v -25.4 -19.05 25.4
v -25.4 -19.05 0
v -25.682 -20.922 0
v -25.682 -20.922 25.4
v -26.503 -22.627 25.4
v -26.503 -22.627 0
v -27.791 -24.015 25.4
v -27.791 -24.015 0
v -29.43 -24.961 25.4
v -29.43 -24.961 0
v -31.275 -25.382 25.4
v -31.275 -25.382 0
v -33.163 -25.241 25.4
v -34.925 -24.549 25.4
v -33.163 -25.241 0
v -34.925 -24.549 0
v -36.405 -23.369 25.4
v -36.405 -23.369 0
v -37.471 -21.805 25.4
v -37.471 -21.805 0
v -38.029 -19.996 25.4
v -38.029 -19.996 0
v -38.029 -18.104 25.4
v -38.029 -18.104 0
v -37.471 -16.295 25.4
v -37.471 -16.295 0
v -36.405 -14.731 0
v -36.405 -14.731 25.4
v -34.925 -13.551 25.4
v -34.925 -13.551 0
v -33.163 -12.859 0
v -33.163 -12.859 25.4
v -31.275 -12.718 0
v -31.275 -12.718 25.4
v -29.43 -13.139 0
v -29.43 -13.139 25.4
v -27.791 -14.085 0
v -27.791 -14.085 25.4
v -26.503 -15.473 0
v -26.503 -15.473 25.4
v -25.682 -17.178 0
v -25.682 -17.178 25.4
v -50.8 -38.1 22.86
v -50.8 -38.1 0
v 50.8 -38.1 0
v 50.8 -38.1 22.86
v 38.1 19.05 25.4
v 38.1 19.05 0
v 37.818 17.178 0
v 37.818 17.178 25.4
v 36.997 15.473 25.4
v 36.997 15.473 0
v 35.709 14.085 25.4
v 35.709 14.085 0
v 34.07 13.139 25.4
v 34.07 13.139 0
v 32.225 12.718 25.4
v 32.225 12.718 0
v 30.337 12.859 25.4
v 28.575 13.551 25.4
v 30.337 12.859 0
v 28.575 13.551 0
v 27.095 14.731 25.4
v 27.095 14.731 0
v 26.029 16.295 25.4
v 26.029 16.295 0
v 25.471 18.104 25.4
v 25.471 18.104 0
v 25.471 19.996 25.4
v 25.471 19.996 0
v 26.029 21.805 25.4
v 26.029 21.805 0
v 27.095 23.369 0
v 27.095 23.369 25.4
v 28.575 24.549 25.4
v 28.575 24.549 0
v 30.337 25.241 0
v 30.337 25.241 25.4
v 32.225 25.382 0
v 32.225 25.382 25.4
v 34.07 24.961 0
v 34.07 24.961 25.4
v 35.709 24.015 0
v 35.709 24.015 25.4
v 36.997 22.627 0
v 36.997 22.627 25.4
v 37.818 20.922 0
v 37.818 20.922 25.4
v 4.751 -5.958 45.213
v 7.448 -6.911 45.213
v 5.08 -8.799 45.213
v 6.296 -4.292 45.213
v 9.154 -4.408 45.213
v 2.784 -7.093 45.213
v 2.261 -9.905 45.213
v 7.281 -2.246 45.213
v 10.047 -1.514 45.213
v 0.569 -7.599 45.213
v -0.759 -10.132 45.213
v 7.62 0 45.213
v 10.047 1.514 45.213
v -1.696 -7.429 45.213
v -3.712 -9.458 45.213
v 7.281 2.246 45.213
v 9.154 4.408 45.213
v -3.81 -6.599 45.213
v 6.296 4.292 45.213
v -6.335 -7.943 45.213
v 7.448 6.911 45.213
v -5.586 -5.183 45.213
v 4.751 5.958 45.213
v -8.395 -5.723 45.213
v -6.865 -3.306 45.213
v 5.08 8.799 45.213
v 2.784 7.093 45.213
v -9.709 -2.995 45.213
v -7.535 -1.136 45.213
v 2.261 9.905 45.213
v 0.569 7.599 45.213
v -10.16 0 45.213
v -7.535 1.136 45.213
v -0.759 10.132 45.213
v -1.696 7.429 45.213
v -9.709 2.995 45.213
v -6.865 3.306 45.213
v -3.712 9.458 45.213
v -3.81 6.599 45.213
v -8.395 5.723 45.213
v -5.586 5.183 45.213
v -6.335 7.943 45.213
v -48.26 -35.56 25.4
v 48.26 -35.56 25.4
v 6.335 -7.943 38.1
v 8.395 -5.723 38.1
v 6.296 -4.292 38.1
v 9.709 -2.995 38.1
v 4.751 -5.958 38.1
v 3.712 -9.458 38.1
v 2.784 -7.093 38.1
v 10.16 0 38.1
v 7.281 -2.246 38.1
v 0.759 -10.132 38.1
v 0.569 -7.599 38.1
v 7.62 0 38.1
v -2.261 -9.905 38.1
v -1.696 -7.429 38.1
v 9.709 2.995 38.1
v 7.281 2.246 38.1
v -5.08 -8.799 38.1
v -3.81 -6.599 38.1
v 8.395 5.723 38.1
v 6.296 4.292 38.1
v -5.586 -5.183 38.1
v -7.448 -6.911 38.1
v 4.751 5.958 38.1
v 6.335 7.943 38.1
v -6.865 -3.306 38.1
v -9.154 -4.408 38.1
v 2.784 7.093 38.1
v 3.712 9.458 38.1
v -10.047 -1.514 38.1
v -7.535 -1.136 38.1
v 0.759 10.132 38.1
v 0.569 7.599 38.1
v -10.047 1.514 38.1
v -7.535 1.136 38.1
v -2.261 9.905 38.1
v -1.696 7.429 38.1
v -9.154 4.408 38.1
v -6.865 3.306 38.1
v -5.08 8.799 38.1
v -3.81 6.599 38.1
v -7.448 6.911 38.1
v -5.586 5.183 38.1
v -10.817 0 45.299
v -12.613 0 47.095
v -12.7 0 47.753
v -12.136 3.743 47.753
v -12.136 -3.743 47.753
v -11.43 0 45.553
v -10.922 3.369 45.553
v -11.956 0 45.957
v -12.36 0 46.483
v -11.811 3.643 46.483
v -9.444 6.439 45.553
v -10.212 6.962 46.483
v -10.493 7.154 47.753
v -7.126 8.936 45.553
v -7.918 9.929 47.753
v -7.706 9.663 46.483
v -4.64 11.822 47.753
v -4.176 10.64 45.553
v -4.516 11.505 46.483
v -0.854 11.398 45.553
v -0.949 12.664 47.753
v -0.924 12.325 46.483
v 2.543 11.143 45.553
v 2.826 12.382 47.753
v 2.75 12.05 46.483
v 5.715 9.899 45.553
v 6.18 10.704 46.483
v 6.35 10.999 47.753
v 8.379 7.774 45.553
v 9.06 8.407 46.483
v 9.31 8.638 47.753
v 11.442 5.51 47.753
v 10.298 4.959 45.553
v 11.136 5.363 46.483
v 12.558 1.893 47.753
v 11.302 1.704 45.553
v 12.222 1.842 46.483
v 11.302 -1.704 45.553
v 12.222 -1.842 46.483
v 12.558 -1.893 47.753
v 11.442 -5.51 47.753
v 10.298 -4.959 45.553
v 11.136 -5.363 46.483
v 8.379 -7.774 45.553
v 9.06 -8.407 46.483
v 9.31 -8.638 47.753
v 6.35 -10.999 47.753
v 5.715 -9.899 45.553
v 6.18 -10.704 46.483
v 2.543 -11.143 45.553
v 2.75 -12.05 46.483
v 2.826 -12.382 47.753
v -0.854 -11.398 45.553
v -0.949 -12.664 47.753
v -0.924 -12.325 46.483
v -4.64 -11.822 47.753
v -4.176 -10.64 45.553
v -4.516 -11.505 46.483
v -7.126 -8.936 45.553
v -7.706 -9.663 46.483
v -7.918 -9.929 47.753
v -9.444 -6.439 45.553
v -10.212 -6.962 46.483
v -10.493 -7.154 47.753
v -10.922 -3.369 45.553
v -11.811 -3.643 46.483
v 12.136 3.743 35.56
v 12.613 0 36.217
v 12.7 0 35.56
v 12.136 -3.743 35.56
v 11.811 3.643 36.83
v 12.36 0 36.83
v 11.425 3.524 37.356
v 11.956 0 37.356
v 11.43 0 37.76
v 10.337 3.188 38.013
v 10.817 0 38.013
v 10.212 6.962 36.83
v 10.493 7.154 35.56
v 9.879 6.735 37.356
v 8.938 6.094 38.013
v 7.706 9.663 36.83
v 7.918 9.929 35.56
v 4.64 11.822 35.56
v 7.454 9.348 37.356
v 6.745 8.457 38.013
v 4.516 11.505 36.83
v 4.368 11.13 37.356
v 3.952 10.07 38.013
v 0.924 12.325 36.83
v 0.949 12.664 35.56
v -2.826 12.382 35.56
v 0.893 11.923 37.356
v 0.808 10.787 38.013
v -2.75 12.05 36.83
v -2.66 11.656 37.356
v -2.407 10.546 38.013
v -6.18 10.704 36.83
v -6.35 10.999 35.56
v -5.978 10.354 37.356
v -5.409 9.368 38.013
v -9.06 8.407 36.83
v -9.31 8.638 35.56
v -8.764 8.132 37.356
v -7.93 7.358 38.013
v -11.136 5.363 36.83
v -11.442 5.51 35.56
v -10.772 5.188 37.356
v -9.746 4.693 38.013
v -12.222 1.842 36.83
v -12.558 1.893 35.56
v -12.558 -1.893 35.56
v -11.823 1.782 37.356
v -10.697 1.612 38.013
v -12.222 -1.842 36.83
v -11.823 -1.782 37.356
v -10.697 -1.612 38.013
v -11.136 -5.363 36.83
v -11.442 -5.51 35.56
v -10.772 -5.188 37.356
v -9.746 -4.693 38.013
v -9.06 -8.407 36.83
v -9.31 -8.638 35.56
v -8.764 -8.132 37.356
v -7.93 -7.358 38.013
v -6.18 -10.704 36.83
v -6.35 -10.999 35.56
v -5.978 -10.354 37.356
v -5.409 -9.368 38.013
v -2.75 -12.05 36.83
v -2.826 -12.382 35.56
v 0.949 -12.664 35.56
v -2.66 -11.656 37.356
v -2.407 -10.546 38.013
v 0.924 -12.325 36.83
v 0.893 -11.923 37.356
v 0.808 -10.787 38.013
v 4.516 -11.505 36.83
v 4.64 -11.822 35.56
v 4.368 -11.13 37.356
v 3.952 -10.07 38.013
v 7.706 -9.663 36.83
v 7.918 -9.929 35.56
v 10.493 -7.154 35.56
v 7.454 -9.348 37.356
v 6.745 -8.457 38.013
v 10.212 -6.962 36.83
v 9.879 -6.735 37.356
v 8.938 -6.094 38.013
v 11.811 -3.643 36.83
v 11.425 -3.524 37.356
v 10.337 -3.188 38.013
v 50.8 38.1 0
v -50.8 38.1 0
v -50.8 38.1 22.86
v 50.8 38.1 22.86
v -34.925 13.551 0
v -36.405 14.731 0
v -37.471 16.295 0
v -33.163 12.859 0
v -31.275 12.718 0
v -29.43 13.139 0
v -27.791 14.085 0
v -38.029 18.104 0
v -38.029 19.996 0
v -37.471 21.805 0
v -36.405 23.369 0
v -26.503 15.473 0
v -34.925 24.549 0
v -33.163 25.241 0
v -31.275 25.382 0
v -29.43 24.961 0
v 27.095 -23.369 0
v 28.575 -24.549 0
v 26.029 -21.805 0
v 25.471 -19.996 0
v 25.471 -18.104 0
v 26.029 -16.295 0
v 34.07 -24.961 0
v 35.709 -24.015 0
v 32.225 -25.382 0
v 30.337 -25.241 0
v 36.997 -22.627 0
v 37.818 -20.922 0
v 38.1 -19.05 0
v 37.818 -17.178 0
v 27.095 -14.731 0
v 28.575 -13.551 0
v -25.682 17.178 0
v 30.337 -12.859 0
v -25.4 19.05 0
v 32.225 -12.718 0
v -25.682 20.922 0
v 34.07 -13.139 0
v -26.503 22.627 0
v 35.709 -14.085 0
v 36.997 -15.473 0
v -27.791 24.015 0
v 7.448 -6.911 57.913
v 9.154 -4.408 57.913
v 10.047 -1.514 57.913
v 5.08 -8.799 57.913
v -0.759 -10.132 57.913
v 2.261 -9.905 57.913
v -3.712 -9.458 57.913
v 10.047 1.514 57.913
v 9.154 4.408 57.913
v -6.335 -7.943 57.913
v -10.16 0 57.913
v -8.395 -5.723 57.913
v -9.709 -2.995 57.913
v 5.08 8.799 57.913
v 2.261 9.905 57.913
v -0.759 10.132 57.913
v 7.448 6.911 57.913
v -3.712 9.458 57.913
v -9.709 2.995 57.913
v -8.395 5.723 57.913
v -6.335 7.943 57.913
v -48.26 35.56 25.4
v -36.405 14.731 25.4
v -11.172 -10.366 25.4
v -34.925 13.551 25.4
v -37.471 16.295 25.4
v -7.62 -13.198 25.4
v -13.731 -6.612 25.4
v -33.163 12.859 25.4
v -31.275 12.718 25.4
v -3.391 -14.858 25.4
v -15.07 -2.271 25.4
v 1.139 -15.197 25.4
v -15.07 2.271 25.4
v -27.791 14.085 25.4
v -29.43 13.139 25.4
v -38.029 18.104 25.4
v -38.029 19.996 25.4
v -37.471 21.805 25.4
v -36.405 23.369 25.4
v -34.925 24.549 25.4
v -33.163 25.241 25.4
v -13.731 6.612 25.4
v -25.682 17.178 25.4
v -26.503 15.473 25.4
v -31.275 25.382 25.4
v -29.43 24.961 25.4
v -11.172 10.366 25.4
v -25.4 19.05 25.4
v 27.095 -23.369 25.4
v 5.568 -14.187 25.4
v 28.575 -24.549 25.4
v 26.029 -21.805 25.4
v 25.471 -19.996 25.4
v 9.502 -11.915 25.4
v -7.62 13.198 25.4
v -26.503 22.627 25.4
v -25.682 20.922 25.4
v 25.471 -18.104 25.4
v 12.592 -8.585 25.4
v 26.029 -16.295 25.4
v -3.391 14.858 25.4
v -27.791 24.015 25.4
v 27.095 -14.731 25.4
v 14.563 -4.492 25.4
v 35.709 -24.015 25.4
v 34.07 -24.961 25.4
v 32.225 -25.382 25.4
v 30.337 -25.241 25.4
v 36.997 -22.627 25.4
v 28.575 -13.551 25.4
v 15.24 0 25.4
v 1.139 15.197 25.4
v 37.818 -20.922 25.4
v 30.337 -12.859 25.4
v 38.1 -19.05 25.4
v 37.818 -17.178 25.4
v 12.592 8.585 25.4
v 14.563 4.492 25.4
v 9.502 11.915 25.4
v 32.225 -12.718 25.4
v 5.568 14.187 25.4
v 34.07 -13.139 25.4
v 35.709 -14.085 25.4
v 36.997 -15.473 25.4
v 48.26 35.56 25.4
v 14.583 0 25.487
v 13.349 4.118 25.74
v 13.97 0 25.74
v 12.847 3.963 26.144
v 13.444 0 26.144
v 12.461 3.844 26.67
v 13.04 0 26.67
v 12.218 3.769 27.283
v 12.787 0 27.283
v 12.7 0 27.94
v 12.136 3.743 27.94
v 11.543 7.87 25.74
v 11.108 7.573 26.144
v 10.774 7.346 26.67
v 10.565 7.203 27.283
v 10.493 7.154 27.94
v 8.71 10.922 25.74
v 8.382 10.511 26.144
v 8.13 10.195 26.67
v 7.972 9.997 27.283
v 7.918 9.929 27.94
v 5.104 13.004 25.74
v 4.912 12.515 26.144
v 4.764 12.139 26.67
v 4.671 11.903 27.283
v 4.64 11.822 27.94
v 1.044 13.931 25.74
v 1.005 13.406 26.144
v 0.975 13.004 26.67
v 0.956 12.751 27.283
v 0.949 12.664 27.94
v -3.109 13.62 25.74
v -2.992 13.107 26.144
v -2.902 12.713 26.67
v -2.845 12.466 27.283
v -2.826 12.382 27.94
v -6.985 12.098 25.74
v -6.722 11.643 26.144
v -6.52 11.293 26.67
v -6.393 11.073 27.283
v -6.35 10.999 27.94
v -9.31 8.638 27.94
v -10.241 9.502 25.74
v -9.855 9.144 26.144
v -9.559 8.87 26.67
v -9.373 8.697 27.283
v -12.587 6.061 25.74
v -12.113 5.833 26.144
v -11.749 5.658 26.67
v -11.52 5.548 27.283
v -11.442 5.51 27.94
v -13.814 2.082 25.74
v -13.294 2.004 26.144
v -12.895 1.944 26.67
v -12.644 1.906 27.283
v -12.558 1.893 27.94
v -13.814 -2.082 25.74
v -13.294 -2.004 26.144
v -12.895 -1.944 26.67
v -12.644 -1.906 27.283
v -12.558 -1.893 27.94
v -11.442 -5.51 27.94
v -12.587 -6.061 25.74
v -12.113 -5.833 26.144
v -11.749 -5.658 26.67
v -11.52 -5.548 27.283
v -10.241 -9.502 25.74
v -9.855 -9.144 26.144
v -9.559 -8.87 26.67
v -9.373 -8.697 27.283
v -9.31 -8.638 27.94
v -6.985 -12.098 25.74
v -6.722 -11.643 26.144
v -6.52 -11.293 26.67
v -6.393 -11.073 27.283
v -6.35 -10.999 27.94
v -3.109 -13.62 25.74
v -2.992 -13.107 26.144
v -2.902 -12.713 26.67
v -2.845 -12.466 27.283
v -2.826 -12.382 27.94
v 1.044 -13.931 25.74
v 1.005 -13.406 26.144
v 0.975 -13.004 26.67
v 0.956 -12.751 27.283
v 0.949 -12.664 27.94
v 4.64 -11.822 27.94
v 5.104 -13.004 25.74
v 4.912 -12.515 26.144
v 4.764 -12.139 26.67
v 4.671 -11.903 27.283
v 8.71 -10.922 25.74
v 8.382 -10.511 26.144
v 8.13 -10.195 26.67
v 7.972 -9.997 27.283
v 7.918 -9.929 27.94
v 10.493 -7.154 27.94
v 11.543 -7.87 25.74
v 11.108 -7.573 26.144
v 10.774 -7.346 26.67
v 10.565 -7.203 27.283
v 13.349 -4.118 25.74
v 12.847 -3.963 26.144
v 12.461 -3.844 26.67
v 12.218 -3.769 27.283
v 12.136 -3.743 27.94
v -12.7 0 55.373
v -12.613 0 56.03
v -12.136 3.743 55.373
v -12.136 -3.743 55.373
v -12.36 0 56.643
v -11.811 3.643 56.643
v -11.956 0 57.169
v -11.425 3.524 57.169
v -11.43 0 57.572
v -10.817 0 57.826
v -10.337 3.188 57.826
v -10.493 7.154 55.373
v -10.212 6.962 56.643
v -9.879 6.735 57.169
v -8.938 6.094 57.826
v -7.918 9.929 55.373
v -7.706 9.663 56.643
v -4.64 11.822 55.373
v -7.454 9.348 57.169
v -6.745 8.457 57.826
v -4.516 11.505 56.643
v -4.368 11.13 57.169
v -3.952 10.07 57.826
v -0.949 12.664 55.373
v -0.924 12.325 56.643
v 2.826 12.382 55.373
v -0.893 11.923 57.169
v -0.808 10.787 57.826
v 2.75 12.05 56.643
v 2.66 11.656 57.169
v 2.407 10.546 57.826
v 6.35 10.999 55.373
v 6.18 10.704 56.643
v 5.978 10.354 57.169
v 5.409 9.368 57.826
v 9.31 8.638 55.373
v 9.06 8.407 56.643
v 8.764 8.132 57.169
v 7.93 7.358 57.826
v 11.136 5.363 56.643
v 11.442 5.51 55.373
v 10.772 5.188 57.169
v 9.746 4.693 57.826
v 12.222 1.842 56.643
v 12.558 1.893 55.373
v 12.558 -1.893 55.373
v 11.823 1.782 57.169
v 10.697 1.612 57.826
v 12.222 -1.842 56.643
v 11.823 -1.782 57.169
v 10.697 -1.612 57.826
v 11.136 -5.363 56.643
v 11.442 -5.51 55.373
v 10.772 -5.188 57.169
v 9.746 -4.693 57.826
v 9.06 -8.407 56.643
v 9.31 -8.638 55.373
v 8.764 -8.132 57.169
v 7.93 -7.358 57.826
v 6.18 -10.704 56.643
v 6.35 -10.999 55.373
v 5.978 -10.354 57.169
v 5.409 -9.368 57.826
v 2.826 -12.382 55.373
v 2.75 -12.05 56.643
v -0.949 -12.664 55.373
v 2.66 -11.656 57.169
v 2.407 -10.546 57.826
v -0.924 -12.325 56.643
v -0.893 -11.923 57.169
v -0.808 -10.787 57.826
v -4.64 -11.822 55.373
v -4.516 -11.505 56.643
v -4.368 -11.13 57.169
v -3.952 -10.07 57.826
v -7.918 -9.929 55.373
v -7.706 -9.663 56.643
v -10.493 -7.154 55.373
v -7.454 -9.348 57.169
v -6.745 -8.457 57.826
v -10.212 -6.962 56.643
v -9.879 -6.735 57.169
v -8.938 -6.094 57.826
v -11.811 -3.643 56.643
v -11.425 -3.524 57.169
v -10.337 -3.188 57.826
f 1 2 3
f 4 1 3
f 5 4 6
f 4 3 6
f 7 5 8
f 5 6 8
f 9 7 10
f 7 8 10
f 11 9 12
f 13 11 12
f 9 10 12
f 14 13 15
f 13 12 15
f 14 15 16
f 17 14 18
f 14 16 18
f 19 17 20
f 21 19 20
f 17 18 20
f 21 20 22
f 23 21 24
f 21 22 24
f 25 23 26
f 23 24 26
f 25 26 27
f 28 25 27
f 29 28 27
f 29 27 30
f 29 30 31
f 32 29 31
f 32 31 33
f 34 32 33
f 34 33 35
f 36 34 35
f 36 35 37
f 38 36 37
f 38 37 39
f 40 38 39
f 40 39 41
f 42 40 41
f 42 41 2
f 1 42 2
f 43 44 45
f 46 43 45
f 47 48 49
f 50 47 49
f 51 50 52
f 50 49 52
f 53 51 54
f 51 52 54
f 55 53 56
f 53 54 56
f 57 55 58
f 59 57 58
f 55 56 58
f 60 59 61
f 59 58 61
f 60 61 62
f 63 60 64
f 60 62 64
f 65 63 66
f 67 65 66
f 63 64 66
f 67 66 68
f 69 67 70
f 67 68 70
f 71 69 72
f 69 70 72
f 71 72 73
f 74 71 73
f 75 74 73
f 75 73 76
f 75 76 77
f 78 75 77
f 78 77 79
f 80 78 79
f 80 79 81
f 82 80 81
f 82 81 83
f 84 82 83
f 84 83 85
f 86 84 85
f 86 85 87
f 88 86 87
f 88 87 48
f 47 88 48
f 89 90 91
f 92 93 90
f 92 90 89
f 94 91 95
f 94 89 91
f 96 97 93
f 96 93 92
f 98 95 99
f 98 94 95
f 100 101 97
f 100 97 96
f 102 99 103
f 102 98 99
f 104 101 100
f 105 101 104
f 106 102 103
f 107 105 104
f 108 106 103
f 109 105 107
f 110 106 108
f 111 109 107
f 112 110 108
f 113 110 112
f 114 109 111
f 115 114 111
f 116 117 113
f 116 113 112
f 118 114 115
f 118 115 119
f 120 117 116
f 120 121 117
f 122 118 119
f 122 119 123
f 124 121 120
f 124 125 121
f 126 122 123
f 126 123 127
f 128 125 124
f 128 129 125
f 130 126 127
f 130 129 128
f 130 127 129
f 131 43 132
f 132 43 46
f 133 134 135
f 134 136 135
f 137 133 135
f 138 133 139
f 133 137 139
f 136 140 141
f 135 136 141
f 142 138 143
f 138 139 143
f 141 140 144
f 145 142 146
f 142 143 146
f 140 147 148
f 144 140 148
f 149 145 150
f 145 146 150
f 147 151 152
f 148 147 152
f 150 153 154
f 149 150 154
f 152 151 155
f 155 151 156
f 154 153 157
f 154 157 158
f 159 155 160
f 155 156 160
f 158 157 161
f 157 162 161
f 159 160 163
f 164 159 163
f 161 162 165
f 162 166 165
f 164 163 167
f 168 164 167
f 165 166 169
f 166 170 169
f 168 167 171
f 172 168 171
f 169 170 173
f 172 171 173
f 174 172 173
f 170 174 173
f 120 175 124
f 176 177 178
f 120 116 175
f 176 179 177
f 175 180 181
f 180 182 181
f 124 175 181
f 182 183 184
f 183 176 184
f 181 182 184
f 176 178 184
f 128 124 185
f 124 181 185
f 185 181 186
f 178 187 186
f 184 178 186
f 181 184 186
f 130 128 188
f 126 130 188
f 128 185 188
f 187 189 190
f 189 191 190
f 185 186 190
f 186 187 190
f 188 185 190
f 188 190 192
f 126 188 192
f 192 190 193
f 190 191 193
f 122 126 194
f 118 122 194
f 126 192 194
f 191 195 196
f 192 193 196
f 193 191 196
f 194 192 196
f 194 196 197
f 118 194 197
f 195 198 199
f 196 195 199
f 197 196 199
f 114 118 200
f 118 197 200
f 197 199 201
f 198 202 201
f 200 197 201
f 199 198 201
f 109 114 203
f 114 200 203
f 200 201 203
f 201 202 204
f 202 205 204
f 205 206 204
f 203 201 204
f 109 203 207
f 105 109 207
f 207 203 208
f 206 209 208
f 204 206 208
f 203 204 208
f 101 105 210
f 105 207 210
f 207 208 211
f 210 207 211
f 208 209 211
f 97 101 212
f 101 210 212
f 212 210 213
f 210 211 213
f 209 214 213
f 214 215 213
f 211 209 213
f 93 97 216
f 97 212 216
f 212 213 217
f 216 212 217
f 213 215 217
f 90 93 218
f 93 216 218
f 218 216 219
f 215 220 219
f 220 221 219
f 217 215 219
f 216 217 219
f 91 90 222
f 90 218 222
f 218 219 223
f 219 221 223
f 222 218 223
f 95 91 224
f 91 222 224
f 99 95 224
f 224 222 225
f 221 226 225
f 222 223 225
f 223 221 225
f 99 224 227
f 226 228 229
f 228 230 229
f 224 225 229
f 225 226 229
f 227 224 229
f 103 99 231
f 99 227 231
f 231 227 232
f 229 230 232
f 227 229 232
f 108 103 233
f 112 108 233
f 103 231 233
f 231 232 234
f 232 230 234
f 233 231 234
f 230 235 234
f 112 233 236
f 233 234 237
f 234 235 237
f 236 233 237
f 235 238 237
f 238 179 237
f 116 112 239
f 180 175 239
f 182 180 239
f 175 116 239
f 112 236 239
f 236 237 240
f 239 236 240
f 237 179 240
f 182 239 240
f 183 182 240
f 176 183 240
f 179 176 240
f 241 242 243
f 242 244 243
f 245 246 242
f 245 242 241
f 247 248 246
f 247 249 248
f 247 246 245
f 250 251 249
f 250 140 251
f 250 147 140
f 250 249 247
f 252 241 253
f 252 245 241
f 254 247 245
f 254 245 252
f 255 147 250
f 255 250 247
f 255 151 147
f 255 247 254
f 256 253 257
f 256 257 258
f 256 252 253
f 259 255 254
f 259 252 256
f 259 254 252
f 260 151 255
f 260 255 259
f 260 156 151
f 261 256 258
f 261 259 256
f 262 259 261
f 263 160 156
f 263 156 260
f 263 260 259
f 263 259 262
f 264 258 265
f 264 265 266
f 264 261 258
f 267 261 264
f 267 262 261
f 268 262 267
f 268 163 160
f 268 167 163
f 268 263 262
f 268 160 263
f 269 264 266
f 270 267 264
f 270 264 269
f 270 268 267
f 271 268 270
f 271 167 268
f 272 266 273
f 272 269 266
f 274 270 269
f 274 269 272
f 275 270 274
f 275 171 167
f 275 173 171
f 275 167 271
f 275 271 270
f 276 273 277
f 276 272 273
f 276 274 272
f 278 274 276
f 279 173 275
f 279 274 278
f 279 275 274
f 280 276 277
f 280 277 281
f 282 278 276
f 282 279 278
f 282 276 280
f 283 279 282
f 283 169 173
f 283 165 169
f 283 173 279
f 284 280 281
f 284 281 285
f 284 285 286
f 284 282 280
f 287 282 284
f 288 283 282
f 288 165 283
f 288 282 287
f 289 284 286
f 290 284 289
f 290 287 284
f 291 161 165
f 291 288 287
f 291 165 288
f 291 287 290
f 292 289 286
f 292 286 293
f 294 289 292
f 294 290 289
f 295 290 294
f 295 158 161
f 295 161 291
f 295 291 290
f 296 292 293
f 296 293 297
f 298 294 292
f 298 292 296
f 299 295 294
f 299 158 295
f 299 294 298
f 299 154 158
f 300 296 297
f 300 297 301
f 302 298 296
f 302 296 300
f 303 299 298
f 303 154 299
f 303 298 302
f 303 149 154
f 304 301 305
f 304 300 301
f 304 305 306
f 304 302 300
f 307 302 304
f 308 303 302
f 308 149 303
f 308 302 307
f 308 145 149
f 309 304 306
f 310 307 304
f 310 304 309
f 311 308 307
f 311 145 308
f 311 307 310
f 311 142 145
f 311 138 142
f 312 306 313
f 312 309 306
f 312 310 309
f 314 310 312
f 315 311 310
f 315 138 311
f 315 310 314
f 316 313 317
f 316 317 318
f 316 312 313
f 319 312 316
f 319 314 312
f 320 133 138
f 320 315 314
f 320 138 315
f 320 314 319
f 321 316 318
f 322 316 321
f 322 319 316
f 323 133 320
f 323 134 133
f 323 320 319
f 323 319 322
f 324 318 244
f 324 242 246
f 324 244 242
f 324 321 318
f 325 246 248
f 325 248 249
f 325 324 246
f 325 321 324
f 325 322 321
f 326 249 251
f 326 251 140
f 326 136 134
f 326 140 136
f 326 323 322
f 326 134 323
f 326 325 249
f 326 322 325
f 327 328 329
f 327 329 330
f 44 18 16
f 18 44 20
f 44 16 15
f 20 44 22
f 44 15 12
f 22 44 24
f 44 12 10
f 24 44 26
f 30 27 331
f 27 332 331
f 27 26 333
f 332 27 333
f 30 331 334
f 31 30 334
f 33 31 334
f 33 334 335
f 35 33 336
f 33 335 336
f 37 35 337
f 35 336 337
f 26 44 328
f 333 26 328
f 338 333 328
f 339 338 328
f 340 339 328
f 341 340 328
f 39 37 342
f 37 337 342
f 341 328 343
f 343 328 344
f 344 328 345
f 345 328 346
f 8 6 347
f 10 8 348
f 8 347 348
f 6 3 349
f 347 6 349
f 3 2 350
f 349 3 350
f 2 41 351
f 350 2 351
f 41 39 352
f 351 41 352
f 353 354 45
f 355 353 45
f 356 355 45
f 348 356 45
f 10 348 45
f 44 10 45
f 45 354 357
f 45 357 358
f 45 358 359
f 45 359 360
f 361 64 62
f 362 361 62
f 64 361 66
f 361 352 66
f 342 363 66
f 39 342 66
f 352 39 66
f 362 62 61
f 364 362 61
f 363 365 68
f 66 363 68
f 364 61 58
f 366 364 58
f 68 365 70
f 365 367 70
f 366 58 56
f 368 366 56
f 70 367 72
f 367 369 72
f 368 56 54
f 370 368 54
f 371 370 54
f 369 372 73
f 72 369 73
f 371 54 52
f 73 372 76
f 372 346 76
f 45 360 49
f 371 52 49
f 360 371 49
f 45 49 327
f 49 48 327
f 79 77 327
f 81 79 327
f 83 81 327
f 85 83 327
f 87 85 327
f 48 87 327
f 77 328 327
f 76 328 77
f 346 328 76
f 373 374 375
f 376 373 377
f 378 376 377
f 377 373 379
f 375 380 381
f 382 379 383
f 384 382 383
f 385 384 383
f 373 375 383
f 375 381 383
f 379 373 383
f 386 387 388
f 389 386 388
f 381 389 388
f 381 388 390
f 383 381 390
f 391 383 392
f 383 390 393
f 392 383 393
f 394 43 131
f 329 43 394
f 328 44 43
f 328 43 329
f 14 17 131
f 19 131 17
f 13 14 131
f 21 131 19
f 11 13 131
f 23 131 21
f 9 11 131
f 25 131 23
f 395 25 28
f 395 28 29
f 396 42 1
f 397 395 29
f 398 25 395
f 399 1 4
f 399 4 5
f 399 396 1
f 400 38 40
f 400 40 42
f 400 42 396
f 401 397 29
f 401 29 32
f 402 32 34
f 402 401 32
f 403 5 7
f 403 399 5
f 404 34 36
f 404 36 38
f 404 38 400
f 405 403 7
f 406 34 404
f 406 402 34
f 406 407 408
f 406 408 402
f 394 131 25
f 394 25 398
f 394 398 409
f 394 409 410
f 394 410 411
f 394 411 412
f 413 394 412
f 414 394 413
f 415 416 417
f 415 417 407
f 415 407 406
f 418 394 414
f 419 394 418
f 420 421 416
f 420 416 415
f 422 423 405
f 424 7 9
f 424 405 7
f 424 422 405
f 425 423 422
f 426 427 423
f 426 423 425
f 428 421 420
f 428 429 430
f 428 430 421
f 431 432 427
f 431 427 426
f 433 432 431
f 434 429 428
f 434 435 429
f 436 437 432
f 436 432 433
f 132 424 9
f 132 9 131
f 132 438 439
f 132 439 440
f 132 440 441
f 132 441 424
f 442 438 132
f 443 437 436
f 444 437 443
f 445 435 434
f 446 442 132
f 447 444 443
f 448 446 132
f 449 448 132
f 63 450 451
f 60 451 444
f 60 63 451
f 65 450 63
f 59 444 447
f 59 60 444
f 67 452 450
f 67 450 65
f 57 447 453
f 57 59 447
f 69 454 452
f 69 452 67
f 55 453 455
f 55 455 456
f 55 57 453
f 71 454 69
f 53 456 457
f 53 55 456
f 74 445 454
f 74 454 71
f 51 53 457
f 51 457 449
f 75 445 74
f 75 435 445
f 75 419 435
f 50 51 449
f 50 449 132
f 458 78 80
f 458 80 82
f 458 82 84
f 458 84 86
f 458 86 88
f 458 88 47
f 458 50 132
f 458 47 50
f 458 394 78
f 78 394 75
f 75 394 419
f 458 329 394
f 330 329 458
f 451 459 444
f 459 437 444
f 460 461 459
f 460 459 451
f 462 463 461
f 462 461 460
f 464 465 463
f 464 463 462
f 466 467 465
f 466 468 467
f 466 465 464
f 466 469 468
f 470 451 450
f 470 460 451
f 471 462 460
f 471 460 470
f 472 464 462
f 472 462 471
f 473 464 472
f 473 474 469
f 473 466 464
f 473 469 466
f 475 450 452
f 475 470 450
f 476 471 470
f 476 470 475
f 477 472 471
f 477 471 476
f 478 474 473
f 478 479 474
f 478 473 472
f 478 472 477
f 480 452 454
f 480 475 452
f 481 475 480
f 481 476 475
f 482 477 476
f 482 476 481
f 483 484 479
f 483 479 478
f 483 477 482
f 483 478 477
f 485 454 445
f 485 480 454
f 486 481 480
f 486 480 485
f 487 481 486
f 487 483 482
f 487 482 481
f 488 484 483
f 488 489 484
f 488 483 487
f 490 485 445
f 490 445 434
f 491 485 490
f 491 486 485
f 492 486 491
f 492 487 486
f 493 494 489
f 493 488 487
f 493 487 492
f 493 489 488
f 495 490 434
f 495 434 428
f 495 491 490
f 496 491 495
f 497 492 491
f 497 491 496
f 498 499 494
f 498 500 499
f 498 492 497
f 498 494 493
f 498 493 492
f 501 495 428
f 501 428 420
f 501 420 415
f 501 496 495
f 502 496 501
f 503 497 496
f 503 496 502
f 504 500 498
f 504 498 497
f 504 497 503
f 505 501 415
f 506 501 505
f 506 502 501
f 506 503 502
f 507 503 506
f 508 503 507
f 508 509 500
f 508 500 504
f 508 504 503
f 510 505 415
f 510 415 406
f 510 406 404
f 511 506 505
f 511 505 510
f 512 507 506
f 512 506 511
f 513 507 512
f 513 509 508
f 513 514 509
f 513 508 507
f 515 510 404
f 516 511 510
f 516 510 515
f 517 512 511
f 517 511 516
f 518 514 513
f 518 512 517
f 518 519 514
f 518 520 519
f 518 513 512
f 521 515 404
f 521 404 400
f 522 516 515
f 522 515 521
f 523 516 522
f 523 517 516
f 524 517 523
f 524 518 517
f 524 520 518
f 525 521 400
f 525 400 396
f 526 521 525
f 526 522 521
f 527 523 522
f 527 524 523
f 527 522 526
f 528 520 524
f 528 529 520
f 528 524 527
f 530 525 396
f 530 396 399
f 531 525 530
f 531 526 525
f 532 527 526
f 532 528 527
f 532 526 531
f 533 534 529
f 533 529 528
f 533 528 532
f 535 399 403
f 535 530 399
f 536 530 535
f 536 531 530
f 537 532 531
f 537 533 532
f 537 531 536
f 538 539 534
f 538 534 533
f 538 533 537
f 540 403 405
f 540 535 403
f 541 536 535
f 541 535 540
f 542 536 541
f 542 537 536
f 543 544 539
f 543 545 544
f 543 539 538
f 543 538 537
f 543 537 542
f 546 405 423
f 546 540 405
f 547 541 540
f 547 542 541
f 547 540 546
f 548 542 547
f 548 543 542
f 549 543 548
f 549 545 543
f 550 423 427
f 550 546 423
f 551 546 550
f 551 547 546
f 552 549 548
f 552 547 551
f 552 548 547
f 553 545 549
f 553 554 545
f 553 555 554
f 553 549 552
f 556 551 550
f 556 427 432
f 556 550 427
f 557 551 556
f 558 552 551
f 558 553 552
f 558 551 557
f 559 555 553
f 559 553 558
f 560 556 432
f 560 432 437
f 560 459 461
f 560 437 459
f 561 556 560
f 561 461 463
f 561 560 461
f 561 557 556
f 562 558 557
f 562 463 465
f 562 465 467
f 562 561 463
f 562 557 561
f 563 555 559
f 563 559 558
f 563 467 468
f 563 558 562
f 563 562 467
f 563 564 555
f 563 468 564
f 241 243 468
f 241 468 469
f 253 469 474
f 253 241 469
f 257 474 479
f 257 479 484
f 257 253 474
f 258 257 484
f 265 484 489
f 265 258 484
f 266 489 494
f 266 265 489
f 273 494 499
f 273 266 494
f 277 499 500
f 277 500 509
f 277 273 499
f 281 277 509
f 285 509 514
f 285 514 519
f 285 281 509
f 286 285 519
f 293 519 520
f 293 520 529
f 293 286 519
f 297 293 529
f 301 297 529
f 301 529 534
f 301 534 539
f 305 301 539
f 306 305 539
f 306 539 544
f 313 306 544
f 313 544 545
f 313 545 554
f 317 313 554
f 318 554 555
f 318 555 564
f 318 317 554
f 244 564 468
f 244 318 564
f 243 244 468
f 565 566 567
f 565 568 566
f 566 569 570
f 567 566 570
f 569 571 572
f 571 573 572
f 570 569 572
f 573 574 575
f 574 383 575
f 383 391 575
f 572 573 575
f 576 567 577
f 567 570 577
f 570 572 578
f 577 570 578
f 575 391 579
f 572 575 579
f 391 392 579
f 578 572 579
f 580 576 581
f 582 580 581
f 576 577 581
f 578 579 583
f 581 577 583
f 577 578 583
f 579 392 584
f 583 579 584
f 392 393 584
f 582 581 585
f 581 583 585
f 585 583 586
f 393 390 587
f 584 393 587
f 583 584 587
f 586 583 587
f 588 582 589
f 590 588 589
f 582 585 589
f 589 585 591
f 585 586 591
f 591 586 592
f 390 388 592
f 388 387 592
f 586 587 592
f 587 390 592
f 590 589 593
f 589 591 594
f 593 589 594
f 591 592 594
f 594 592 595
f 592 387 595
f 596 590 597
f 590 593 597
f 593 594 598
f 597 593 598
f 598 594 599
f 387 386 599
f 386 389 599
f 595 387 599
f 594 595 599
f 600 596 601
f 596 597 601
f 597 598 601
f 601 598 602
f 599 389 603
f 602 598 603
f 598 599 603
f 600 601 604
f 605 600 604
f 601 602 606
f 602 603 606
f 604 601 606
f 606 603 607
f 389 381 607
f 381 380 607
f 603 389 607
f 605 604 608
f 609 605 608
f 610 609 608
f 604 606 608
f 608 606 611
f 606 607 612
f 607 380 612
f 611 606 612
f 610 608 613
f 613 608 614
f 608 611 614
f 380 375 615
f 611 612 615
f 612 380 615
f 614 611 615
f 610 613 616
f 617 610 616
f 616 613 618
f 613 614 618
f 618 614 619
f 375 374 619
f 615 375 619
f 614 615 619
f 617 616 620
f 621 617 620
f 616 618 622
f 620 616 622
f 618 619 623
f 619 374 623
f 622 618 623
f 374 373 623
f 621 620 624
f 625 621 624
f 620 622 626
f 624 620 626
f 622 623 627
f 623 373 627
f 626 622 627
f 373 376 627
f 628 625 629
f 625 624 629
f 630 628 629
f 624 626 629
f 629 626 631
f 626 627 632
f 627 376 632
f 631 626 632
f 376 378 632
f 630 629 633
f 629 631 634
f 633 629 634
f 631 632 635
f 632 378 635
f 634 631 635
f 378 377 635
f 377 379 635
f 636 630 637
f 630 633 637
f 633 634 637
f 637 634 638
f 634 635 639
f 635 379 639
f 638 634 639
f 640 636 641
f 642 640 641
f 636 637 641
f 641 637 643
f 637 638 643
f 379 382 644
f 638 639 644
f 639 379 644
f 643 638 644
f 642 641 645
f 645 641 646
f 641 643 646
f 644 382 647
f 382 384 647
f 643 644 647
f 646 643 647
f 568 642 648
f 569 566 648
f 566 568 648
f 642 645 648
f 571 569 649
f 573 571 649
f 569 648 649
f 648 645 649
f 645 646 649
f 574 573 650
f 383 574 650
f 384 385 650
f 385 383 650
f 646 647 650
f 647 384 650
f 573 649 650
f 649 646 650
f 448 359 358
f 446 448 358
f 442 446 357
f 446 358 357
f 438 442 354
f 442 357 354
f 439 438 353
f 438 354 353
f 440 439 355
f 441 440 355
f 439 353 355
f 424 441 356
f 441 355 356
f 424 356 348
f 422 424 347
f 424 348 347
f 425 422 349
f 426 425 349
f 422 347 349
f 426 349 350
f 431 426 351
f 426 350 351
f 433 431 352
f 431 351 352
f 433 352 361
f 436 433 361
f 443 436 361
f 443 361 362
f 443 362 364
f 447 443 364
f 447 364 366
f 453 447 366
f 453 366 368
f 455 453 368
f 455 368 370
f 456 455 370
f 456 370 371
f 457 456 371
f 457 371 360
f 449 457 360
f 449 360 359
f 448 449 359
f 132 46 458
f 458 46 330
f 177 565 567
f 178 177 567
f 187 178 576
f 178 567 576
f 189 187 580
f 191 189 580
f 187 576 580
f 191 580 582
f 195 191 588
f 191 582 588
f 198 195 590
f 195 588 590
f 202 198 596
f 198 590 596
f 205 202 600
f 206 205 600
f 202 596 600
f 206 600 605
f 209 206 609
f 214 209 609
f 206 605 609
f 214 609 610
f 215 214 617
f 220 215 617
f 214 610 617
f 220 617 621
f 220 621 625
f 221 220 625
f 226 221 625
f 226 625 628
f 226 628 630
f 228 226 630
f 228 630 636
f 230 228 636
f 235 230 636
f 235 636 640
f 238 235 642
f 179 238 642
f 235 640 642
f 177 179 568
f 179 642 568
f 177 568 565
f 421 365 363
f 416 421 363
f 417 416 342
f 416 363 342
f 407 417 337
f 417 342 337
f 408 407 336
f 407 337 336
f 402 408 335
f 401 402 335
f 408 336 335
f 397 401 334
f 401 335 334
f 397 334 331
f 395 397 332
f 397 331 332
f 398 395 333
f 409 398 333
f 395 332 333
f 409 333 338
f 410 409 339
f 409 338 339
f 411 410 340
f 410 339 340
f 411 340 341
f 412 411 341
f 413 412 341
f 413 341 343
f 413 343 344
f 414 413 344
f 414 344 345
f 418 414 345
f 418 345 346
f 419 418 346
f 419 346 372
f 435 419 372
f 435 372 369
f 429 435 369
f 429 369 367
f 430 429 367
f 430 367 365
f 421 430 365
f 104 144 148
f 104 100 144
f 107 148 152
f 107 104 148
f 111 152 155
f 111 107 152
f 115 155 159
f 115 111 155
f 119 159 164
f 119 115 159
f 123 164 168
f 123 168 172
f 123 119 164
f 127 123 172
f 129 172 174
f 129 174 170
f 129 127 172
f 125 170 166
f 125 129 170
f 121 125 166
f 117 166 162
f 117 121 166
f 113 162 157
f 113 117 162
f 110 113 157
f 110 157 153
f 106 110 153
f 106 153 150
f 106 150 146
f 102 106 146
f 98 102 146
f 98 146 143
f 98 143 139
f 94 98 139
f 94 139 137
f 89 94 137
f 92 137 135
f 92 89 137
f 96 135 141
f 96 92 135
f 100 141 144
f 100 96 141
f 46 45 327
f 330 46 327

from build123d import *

# Parameters (mm, degrees)
F0_W     = 101.6
F0_H     = 76.2
F1_DEPTH = 25.4
F2_R     = 6.35
F3_DEPTH = 25.401
F4_W     = 12.7
F4_H     = 12.7
F6_W     = 7.62
F6_H     = 7.1126786113
F8_W     = 12.7
F8_H     = 12.7
F10_R    = 2.54
F11_SIZE = 2.54
F12_R    = 2.54


with BuildPart() as f1:
    # F0 (on Top) → F1 (new body)
    with BuildSketch(Plane.XY):
        Rectangle(F0_W, F0_H)
    extrude(amount=F1_DEPTH)

    # F2 (on face) → F3 (cut, through all)
    with BuildSketch(Plane(origin=(0, 0, 0), x_dir=(1, 0, 0), z_dir=(0, 0, -1))):
        with Locations((31.75, 19.05)):
            Circle(F2_R)
        with Locations((31.75, -19.05)):
            Circle(F2_R)
        with Locations((-31.75, -19.05)):
            Circle(F2_R)
        with Locations((-31.75, 19.05)):
            Circle(F2_R)
    extrude(amount=-F3_DEPTH, mode=Mode.SUBTRACT)

    # F4 (on Front) → F5 (revolve)
    with BuildSketch(Plane.XZ):
        with Locations((6.35, 31.75)):
            Rectangle(F4_W, F4_H)
    revolve(axis=Axis((0, 0, 31.75), (0, 0, 1)))

    # F6 (on Front) → F7 (revolve)
    with BuildSketch(Plane.XZ):
        with Locations((3.81, 41.6563393056)):
            Rectangle(F6_W, F6_H)
    revolve(axis=Axis((0, 0, 41.6563393056), (0, 0, 1)))

    # F8 (on Front) → F9 (revolve)
    with BuildSketch(Plane.XZ):
        with Locations((-6.35, 51.5626786113)):
            Rectangle(F8_W, F8_H)
    revolve(axis=Axis((0, 0, 51.5626786113), (0, 0, -1)))

    # F10
    f10_edges = [f1.edges().sort_by_distance(p)[0] for p in [
        (12.7, 0, 57.912679),
    ]]
    fillet(f10_edges, radius=F10_R)

    # F11
    f11_edges = [f1.edges().sort_by_distance(p)[0] for p in [
        (0, -38.1, 25.4),
        (-50.8, 0, 25.4),
        (0, 38.1, 25.4),
        (50.8, 0, 25.4),
    ]]
    chamfer(f11_edges, length=F11_SIZE)

    # F12
    f12_edges = [f1.edges().sort_by_distance(p)[0] for p in [
        (-12.7, 0, 25.4),
        (-12.7, 0, 38.1),
        (12.7, 0, 45.212679),
    ]]
    fillet(f12_edges, radius=F12_R)


solid = f1.part
